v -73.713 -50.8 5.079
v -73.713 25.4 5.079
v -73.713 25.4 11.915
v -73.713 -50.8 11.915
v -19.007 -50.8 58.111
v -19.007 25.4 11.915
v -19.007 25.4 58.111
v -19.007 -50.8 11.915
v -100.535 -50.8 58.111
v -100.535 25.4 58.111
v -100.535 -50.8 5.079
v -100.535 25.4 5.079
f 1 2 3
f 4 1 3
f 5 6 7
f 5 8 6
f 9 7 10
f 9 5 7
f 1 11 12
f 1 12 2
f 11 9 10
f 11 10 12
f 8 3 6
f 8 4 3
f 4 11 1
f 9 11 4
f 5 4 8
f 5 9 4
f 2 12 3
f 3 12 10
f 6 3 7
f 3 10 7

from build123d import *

# Parameters (mm, degrees)
F1_DEPTH      = 50.8
F1_DEPTH_BACK = 25.4


with BuildPart() as f1:
    # F0 (on Front) → F1 (new body, two sides)
    with BuildSketch(Plane.XZ) as f1_sk:
        Polygon((-19.007457, 58.110539), (-100.5354, 58.110539), (-100.5354, 5.079421), (-73.713064, 5.079421), (-73.713064, 11.915244), (-19.007457, 11.915244), align=None)
    extrude(amount=F1_DEPTH)
    extrude(f1_sk.sketch, amount=-F1_DEPTH_BACK)


solid = f1.part
